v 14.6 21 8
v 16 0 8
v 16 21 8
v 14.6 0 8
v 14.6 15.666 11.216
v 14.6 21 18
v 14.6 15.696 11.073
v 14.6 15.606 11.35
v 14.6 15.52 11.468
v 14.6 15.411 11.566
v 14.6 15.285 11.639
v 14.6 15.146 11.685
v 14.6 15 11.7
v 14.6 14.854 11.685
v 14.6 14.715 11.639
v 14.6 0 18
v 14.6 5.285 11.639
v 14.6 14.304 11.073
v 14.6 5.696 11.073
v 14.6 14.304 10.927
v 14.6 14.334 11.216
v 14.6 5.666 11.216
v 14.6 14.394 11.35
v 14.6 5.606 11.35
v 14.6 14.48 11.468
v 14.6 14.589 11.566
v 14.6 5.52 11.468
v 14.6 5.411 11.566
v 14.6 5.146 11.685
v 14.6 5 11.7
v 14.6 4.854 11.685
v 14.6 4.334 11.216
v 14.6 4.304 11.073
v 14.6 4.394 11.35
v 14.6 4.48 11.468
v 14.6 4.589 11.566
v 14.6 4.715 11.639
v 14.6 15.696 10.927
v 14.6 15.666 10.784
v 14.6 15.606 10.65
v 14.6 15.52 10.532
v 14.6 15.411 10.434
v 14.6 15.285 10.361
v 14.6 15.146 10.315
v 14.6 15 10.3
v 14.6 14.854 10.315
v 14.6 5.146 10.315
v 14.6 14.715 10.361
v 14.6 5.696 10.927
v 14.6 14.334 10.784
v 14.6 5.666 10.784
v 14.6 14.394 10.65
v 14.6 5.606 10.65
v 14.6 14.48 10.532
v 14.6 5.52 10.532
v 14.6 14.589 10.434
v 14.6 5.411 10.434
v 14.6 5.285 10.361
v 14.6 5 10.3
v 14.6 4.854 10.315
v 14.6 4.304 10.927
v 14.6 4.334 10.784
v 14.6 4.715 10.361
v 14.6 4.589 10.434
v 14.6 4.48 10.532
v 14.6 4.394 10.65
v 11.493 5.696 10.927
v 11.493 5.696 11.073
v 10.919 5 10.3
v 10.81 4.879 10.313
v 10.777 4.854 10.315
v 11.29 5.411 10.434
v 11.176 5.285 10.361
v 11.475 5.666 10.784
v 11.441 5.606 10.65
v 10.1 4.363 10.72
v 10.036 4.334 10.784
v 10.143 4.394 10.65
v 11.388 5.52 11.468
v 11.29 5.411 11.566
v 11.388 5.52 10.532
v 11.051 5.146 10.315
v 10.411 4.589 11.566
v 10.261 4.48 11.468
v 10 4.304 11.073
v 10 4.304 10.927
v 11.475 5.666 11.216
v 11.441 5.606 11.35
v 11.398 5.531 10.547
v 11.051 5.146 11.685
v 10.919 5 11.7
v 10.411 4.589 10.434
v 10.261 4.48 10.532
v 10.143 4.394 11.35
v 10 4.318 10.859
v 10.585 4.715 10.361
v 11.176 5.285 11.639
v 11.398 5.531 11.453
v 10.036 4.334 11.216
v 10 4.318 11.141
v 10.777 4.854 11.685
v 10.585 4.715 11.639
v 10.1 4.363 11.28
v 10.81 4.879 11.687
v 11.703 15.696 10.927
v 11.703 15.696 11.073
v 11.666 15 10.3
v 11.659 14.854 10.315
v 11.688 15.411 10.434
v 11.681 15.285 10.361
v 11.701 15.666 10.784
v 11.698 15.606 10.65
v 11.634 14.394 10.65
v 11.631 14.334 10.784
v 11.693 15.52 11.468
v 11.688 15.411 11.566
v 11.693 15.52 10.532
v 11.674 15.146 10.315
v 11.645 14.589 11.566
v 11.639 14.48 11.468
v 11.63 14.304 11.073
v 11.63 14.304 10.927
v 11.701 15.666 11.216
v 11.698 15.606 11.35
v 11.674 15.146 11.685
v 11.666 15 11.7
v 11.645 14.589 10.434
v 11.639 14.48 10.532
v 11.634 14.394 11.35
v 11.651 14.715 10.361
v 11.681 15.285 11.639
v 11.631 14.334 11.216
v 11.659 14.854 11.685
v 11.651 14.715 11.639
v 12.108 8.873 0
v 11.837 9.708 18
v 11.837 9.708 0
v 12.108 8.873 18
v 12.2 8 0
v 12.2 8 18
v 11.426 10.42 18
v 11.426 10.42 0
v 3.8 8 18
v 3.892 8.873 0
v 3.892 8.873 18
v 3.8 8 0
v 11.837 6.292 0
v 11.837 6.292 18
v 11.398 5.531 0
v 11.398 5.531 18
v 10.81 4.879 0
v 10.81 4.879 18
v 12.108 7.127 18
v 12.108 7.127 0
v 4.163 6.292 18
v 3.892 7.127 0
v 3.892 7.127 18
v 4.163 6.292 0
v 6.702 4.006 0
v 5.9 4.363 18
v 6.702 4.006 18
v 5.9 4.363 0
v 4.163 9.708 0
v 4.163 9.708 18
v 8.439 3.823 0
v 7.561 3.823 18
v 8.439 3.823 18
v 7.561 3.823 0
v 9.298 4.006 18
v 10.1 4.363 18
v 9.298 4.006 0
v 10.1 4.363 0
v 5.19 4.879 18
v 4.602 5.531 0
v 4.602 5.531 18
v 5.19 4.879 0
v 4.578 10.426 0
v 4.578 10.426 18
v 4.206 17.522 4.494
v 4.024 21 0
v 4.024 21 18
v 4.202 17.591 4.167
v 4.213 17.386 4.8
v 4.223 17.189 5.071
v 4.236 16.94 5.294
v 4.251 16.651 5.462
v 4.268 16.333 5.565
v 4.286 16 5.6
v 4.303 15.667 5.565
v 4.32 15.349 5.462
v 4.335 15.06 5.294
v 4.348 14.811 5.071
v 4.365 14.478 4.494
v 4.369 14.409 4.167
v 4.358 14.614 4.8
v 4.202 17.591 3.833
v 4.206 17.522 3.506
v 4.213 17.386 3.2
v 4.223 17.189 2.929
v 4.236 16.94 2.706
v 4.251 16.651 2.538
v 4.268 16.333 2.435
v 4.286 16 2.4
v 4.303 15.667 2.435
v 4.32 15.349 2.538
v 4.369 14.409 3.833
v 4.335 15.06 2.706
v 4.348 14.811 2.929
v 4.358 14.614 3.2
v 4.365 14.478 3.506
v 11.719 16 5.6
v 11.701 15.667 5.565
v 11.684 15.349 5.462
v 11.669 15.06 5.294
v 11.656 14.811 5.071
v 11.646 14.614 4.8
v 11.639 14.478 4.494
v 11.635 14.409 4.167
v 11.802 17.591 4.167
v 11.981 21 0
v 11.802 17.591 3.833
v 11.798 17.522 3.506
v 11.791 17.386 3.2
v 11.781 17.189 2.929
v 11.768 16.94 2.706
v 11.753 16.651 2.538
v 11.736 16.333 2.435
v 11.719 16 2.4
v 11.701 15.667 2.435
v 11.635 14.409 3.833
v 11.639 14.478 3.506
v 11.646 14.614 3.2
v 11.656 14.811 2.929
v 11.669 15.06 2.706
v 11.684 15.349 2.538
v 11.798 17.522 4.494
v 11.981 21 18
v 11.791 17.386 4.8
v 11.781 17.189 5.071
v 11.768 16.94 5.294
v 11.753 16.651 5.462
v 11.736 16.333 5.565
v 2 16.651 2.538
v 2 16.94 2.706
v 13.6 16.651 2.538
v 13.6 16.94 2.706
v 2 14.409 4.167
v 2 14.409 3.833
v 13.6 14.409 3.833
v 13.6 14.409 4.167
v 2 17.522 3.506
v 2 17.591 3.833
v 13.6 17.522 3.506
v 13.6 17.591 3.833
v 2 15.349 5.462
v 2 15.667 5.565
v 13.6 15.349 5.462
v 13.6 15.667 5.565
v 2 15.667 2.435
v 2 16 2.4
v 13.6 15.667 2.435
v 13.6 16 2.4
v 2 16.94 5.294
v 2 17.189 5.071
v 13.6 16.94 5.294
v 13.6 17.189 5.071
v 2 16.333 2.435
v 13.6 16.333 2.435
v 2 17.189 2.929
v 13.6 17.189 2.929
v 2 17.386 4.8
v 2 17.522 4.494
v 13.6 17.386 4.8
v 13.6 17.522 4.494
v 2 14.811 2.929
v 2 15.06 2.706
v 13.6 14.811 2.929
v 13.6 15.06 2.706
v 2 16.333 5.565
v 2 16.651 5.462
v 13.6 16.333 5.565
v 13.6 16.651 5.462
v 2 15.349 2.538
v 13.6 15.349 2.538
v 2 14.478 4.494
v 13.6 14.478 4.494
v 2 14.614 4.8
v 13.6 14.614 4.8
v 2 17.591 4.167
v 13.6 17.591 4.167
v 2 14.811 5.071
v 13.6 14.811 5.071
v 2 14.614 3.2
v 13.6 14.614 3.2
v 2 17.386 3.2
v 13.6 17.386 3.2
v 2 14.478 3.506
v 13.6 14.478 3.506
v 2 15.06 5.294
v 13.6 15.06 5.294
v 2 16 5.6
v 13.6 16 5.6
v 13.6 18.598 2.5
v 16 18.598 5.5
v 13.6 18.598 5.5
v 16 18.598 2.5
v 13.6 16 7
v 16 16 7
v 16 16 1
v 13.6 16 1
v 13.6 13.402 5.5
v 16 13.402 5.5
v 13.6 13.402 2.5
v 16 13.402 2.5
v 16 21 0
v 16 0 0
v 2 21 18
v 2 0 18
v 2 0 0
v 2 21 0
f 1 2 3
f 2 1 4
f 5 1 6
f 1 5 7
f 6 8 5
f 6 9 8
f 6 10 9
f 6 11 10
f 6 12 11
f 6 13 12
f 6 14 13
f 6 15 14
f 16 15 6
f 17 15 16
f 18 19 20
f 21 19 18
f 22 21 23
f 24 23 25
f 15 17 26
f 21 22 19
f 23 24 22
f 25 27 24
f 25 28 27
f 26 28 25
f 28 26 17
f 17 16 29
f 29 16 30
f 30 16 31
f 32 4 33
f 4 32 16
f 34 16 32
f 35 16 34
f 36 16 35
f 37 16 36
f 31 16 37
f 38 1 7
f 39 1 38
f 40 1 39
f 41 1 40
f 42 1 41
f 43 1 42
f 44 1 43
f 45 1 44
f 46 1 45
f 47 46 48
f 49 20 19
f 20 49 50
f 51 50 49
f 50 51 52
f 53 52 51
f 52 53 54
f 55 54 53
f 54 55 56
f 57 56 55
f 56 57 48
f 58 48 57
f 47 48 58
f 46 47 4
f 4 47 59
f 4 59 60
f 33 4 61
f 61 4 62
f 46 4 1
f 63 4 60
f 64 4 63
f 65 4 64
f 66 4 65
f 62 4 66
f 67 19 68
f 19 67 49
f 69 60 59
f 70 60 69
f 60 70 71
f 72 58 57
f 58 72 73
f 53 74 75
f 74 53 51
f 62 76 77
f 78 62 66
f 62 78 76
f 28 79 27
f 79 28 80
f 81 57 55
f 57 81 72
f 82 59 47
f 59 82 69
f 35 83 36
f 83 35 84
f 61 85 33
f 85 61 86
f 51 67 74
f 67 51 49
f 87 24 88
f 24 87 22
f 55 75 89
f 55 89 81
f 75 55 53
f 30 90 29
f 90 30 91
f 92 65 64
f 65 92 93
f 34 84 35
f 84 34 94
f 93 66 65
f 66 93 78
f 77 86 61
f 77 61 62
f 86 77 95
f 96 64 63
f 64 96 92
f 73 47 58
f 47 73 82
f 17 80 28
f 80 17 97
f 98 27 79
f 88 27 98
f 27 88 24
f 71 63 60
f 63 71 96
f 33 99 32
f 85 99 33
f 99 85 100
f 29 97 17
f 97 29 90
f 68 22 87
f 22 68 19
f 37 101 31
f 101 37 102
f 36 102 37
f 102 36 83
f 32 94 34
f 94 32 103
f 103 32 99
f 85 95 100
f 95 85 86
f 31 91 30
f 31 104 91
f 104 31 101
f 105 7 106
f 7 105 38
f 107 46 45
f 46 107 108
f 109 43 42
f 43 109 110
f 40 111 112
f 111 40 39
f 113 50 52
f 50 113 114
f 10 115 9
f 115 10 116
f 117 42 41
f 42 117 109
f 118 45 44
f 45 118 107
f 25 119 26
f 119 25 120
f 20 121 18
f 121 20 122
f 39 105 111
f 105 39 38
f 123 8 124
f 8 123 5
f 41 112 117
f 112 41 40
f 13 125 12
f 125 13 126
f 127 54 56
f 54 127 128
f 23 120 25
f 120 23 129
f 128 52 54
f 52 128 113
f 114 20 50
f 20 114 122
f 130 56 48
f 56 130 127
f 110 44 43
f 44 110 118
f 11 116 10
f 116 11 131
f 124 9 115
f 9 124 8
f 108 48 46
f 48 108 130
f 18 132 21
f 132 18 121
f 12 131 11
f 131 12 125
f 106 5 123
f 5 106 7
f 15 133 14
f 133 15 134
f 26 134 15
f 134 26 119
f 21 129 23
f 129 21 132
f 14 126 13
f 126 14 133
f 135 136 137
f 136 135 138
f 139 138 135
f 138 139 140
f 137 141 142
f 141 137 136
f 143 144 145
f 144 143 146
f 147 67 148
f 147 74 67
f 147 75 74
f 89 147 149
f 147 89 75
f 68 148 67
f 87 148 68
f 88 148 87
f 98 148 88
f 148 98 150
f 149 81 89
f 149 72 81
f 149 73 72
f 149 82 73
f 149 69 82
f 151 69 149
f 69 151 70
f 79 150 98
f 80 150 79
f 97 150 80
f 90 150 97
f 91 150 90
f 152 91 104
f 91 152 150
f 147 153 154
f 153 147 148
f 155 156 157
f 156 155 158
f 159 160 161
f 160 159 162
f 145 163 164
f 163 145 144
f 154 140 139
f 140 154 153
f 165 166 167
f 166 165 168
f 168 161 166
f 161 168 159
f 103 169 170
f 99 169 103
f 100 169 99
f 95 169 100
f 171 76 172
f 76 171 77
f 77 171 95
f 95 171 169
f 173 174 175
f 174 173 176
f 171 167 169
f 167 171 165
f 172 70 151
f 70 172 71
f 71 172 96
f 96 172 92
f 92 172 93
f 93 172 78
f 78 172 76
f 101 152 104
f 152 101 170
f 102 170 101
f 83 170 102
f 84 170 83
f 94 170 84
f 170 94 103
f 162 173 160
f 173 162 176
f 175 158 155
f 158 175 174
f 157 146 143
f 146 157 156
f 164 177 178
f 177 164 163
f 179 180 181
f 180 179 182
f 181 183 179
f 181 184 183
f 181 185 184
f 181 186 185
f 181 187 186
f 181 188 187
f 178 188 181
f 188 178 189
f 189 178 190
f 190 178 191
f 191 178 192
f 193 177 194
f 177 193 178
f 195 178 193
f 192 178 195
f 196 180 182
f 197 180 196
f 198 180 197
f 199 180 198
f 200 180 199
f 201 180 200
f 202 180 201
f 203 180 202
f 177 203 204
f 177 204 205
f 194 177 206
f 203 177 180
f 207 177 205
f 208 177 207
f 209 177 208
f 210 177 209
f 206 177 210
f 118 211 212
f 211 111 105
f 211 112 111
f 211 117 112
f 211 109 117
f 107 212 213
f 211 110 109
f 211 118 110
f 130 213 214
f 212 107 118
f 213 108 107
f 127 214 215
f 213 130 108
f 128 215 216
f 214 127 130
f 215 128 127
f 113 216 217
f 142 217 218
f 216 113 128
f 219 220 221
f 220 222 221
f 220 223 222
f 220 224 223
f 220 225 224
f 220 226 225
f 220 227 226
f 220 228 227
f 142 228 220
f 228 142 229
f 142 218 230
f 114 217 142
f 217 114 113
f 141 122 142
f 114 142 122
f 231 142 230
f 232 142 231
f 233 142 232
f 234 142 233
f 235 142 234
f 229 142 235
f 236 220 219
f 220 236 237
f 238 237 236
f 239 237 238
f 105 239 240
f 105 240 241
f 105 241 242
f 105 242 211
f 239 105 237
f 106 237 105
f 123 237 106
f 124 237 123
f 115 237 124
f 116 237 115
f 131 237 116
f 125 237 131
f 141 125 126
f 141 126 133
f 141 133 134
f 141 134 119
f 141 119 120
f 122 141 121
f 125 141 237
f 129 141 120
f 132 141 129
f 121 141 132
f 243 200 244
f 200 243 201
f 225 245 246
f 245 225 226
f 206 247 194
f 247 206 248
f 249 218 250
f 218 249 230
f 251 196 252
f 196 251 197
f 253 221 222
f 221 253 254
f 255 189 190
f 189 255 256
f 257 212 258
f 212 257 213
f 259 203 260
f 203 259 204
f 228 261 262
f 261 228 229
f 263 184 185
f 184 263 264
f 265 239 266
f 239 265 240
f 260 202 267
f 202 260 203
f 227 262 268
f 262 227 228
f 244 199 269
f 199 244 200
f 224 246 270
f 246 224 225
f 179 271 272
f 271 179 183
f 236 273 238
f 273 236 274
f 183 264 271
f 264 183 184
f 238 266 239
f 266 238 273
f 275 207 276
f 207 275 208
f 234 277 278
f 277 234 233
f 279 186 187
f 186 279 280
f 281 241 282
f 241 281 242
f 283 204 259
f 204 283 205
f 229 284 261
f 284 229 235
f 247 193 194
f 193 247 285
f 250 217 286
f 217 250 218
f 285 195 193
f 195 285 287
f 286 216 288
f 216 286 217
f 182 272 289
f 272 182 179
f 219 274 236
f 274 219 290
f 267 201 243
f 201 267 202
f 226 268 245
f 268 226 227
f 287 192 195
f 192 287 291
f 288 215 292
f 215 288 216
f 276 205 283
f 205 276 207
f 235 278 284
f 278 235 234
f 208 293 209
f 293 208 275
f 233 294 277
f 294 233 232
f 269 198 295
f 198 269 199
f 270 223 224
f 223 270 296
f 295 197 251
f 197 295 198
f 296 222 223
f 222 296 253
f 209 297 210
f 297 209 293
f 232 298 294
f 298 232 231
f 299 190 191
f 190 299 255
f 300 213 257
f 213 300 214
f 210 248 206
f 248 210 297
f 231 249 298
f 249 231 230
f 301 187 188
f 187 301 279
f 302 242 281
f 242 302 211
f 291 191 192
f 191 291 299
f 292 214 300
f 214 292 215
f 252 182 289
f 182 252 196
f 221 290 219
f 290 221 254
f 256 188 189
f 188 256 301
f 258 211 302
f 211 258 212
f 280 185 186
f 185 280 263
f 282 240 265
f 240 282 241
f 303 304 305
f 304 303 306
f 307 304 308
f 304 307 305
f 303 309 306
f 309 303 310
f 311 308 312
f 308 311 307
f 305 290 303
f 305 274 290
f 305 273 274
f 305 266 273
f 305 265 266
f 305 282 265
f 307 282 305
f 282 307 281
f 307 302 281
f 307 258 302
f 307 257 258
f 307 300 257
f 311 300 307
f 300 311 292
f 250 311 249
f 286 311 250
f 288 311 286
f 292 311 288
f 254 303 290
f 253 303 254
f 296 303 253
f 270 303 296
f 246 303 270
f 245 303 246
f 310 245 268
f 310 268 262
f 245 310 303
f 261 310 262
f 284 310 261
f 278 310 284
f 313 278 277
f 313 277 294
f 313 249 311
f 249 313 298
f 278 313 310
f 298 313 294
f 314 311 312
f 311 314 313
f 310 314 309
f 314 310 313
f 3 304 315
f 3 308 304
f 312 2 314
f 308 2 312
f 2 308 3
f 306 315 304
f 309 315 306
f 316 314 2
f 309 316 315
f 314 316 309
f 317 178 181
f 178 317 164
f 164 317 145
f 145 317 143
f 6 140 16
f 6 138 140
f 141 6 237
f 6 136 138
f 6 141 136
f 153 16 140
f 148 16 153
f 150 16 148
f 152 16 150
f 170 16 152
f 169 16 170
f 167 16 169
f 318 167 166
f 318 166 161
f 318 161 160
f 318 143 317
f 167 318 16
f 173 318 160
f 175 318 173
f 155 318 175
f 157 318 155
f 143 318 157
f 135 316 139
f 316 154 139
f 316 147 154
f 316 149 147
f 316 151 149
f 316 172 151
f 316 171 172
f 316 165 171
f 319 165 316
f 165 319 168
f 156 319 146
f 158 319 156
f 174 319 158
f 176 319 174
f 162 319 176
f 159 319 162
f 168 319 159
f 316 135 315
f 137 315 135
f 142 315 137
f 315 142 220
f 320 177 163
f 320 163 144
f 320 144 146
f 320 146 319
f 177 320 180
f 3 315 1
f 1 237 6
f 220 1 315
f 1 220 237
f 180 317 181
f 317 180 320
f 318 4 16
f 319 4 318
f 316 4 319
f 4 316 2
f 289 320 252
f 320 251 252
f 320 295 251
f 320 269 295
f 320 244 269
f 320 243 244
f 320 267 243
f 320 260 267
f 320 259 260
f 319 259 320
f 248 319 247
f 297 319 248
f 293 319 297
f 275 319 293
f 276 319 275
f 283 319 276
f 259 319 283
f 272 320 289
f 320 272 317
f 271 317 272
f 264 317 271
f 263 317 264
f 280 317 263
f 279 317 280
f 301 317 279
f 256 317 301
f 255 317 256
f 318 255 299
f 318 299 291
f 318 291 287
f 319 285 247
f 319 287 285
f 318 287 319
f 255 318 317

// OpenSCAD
// RebeliX
//
// z endstop holder
// GNU GPL v3
// Martin Neruda <neruda@reprap4u.cz>
// http://www.reprap4u.cz

difference(){
	cube([16,21,18], center = false);
	union() {
		translate([14.6,-0.1,8])cube([1.5,22,11]);
		
		translate([10,5,11]) rotate([0,90,0]) cylinder(r=0.7, h = 10, $fn=30);
		translate([10,15,11]) rotate([0,90,0]) cylinder(r=0.7, h = 10, $fn=30);
		
		translate([16/2-3.3,10,-0.1])cube(size = [6.6,25,26]);
		translate([16/2,8,-0.1])cylinder(h = 30, r=4.2, $fn=30);

		translate([4.6,10,-0.1])rotate([0,0,3])cube([3,15,26]);
		translate([8.4,10,-0.1])rotate([0,0,-3])cube([3,15,26]);

		translate([-0.1,21-5,4])rotate([0,90,0])cylinder(h = 16, r=1.6, $fn=30);
		translate([16-2.4,21-5,4])rotate([0,90,0])cylinder(h = 2.5, r=3, $fn=6);	
	}
    cube([2,21,18],center=false);
}
